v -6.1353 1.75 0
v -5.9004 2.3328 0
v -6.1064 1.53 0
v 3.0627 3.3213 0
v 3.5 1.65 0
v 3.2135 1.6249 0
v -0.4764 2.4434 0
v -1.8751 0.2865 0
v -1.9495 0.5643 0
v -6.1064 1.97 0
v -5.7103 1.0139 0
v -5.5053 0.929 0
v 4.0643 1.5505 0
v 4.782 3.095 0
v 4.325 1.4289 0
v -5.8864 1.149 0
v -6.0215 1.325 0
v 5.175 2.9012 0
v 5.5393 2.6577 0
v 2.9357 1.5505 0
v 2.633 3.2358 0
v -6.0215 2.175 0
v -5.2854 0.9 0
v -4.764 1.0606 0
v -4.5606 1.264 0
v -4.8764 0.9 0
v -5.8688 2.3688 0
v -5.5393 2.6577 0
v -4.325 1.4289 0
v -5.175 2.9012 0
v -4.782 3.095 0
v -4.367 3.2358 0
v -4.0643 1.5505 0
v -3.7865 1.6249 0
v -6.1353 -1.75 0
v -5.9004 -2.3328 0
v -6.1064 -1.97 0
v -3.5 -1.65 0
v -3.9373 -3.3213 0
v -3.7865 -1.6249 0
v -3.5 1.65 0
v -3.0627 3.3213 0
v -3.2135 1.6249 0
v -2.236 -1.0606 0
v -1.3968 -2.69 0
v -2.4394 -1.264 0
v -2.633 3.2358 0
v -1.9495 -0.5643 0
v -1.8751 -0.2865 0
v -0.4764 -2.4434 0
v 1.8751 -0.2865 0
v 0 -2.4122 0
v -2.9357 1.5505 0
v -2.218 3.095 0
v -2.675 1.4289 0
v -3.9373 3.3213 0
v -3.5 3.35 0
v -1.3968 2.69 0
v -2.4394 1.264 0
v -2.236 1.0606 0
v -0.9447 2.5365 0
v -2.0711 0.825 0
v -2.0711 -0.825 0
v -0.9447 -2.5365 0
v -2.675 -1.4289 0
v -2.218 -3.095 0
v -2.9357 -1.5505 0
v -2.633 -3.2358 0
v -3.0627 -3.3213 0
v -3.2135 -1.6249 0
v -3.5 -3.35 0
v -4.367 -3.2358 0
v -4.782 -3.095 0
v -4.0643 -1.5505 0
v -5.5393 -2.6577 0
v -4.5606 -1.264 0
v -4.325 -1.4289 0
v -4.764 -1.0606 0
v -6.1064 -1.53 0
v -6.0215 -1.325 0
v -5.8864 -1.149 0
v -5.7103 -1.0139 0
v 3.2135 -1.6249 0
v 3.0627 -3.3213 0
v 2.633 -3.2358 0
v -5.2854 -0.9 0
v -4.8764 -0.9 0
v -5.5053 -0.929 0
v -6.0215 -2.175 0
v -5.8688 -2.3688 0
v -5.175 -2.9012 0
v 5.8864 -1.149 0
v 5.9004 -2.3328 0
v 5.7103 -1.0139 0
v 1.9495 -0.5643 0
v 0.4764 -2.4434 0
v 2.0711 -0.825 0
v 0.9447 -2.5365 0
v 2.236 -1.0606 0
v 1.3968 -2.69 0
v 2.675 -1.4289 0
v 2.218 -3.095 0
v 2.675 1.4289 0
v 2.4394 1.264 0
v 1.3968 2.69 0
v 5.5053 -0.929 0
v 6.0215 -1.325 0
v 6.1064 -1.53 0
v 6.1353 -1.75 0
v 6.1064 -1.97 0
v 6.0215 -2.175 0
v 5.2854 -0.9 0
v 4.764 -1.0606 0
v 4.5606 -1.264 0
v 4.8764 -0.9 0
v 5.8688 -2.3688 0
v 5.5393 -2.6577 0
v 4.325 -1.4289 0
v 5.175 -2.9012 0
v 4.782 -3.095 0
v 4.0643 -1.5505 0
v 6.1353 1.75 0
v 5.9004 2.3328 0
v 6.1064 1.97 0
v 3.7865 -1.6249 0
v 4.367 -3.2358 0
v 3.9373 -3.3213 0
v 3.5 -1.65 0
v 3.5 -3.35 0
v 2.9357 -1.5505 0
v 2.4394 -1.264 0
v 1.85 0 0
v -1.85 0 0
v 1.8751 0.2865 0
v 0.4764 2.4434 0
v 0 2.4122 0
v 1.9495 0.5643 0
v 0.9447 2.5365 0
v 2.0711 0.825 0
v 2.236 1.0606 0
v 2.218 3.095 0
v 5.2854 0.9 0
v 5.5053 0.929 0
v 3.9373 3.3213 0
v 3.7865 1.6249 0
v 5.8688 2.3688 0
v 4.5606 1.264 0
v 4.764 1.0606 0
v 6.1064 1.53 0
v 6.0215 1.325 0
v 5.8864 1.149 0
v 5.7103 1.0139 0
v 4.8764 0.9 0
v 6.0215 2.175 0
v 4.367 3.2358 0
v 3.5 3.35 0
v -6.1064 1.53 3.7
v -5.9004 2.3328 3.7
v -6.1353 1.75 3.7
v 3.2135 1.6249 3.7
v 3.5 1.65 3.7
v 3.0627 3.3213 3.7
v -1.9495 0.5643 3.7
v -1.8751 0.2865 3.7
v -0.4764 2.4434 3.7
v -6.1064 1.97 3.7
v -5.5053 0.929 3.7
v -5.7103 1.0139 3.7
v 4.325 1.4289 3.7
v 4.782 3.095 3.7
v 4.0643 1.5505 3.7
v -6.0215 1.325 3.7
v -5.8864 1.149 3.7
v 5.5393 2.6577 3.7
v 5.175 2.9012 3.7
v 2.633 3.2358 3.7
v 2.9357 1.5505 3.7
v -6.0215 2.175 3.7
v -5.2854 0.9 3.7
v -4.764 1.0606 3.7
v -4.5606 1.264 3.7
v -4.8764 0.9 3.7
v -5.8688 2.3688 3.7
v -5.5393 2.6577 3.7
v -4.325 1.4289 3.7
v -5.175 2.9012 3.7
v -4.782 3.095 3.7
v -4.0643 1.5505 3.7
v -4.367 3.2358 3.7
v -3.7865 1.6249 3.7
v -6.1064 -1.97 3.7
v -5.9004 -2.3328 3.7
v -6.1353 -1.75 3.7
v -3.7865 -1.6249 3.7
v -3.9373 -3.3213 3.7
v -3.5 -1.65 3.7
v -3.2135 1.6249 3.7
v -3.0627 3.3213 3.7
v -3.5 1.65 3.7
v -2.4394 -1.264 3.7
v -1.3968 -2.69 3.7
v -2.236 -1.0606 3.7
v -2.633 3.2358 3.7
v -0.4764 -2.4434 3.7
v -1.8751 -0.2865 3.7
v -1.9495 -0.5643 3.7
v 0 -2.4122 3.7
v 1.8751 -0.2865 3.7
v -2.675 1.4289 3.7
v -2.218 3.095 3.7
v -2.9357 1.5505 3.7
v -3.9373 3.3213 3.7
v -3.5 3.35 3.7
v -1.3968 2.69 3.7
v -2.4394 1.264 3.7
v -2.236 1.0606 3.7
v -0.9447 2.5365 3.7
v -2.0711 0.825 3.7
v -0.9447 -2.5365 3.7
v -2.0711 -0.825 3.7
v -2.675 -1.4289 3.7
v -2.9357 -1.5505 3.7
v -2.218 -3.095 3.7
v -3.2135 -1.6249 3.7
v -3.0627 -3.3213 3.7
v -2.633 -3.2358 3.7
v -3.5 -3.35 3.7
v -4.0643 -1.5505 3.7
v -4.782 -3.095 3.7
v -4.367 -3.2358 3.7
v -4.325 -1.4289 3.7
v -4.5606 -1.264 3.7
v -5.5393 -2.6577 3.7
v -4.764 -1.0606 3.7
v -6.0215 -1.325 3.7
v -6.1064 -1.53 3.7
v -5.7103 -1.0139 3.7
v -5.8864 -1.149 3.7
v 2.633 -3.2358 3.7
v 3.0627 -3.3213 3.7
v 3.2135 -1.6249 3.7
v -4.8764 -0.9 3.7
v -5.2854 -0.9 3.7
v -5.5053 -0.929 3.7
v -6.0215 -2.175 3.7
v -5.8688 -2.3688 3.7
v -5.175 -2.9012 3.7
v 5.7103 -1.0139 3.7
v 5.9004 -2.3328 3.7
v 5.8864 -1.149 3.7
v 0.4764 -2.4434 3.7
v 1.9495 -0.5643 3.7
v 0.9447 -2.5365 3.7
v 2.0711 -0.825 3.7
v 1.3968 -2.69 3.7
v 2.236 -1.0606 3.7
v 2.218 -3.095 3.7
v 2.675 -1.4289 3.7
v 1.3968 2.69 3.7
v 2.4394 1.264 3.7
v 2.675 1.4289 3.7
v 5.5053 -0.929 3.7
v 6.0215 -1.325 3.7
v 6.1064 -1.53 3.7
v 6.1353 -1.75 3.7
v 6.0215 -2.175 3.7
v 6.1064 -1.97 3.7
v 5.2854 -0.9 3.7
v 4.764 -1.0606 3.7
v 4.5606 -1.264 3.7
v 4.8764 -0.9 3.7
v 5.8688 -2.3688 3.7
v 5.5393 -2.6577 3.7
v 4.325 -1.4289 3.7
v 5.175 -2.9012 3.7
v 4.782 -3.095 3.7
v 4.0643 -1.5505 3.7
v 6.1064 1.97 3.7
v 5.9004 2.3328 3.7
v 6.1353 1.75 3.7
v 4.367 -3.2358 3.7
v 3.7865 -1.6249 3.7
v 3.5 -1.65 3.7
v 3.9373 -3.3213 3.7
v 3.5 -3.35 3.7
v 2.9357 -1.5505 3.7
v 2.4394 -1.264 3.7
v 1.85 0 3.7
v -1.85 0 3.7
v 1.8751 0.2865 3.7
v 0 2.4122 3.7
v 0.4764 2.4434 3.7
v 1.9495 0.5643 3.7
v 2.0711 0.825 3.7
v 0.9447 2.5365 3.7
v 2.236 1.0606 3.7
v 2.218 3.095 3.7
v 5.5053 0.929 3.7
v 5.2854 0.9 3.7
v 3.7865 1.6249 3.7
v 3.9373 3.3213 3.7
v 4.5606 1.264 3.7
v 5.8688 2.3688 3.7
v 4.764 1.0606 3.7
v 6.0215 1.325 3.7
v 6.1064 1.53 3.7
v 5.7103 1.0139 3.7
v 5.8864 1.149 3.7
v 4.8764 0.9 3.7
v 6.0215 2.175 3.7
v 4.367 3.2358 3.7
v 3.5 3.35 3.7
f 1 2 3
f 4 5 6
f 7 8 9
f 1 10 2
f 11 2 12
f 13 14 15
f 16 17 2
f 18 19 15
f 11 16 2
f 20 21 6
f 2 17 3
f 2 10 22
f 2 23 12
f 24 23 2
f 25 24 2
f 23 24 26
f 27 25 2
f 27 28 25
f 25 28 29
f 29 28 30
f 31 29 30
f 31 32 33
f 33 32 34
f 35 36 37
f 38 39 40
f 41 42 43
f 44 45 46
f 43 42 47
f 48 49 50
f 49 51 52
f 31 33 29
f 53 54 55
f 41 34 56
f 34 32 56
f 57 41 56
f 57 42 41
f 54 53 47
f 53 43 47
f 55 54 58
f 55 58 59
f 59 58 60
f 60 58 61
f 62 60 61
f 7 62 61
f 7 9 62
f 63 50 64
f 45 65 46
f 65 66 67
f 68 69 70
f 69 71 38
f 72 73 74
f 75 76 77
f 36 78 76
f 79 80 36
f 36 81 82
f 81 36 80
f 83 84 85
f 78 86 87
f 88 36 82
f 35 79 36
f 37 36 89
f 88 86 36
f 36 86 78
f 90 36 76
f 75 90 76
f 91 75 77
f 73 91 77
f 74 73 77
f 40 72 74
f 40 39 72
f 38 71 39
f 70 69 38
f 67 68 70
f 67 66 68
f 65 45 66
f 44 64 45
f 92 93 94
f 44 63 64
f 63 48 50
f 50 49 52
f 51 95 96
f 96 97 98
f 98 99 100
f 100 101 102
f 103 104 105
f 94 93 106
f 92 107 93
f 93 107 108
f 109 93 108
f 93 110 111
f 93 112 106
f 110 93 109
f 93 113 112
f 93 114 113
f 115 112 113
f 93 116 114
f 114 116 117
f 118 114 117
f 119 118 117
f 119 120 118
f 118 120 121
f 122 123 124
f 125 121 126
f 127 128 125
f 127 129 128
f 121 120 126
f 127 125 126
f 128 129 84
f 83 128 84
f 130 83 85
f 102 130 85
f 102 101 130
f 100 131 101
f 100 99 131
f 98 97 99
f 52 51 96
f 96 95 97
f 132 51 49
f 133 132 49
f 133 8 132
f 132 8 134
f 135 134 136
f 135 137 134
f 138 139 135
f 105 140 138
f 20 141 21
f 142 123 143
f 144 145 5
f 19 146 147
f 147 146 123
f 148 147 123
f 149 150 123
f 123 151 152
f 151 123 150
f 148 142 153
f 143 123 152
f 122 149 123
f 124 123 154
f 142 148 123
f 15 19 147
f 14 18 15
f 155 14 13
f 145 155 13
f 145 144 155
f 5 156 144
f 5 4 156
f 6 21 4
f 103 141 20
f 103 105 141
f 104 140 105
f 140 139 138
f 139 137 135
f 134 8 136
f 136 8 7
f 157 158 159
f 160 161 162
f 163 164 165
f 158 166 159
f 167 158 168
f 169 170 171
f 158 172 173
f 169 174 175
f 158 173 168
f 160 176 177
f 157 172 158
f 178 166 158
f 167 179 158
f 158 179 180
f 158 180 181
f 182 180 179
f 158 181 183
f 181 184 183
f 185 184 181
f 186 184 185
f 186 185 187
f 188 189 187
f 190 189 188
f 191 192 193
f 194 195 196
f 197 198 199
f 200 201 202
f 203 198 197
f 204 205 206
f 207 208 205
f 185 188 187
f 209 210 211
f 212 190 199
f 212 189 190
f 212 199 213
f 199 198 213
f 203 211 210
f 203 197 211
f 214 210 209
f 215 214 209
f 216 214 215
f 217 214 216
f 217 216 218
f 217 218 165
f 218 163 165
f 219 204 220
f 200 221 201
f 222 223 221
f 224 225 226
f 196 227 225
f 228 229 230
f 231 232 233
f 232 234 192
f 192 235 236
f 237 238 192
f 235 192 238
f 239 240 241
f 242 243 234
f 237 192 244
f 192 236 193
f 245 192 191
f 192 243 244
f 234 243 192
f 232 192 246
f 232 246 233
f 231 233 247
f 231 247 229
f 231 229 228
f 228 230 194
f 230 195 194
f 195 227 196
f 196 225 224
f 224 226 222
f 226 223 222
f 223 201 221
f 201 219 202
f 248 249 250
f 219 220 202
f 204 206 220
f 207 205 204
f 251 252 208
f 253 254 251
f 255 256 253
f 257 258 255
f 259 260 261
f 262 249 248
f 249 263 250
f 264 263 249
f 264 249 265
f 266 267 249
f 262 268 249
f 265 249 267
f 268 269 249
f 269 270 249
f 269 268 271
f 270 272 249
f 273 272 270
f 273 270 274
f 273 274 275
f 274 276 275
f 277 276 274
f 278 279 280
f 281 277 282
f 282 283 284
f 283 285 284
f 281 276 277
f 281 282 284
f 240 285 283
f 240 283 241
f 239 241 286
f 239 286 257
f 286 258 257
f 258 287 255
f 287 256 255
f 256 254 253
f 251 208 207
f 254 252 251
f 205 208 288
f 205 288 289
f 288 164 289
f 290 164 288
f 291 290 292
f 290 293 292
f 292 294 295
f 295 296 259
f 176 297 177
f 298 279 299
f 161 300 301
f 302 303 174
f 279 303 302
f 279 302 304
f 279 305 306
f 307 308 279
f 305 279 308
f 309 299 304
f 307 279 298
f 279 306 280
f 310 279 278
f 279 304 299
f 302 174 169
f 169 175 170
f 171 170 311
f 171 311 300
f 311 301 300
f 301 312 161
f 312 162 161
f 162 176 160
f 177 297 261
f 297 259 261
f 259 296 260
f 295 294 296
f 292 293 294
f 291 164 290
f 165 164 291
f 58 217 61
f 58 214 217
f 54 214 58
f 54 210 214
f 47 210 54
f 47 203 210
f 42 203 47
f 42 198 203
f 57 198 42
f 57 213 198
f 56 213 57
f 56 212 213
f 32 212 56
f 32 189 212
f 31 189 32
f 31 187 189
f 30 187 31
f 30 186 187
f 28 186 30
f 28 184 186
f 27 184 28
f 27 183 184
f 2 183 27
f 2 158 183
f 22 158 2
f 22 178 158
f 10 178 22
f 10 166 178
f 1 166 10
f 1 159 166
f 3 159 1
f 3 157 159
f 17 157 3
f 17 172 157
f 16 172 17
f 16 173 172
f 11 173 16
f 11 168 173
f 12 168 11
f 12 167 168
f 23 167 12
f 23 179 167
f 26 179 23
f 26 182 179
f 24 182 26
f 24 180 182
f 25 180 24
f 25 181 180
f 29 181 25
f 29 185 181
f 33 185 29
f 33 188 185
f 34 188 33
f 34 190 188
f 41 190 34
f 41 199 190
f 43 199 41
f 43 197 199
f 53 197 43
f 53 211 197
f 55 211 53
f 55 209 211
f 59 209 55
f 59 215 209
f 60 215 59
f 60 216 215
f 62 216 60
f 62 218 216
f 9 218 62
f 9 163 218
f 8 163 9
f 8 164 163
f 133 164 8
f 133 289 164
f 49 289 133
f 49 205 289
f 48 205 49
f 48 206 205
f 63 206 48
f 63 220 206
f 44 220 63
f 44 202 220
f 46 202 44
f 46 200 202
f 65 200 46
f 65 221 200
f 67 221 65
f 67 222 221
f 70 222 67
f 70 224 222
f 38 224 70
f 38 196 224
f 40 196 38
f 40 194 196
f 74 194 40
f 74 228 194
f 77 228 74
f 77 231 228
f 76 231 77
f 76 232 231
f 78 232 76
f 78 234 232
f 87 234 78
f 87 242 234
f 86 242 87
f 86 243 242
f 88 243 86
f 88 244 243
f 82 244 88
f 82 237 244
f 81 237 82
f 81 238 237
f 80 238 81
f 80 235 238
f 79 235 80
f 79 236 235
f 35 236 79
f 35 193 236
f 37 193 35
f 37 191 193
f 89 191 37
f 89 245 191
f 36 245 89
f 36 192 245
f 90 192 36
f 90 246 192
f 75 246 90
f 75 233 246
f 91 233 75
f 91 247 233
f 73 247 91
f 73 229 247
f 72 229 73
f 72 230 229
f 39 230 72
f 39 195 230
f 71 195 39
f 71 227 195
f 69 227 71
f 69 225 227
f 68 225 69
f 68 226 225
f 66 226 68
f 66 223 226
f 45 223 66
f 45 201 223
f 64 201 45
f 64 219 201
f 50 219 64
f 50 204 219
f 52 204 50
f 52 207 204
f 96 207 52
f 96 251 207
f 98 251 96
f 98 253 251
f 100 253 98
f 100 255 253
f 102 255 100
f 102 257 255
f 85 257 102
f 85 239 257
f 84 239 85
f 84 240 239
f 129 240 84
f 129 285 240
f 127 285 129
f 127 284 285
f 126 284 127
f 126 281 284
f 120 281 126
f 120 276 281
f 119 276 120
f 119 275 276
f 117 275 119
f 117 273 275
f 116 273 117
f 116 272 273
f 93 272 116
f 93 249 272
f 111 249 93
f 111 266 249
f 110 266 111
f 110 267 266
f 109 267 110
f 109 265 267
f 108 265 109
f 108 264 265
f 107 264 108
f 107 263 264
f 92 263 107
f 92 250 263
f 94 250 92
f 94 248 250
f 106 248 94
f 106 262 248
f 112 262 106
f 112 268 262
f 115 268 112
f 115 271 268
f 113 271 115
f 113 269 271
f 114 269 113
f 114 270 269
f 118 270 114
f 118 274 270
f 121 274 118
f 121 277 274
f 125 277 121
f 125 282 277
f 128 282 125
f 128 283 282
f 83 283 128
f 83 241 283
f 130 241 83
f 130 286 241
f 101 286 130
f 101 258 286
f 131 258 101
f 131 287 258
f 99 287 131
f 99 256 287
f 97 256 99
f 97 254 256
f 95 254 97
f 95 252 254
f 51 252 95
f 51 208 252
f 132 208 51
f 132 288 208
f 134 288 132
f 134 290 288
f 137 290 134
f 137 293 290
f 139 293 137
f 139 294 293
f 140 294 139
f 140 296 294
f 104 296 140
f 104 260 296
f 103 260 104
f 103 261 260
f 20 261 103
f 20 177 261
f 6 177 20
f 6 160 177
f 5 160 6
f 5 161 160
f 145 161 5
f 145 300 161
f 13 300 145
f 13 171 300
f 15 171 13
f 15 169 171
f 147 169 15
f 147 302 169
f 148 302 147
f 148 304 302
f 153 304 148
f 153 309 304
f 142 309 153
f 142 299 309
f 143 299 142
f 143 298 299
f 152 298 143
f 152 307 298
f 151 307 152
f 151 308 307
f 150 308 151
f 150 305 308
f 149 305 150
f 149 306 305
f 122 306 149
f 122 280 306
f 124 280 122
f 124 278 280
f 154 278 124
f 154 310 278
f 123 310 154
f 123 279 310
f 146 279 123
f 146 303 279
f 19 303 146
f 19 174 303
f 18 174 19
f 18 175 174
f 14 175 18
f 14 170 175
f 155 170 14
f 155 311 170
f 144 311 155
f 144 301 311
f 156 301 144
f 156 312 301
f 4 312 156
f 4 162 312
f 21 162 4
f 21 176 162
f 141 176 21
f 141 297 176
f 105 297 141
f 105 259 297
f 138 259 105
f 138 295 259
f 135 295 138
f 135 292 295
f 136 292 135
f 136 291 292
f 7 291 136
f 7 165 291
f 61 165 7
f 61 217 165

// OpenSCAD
// Allsorts Bracelet provided by Stellar Innovation
// http://www.thingiverse.com/stellarinnovation/about
// under Creative Commons License, Attribution (BY)

// Select part to print
partToPrint=1; // [1:link, 2:cube-bottom, 3:cube-middle, 4:cube-top, 5:whole-cube, 6:puck-outer, 7:puck-inner, 8:whole-puck, 9:button, 10:magnet-lock]

// Height of "cube" part
cubeHeight = 9.5;   // [7.5:0.5:12.5]

// Width of "cube" part
cubeWidth=19.0; // [15:0.5:25]

// Outer diameter of "puck" part
puckOuterDiameter=22.5; // [20:0.5:25]

// Inner diameter of "puck" part
puckInnerDiameter=9.5;  // [7.5:0.5:10]

// Height of "puck" part
puckHeight=11.5;    // [10:0.5:15]

// Diameter of "button" part
buttonDiameter=17; // [15:0.5:25]

// Outer diameter of magnet lock
tubeDiameter = 12.7;       // [10:0.1:15]

// Length of magnet lock
tubeLength = 22;        // [15:1:25]

// Diameter of magnet +tolerance (magnet-lock part only)
magnetDiameter = 10.5;           // [2:0.1:15]

// Length of magnet (magnet-lock part only)
magnetLength = 2;             // [2:0.1:10]


linkAxleDiameter = 1*3;
linkWall = 1*2;
linkOuterDiameter = 2*linkWall + linkAxleDiameter;
linkWidth = 1*4;

buttonHeight=1*6.4;
buttonPearlDiameter=1*1.6;
buttonPearlGrid=1*2.5;
buttonEdgeRadius=1*3;

tightFit=1*0.15;
clearance = 1*0.3;

if (partToPrint==1) {
  TypeBLink(linkWidth, linkOuterDiameter, linkAxleDiameter, 0, clearance);
}
else if (partToPrint==2 || partToPrint==4) {
  colors=["White", "Black", "Orange"];
  color(colors[partToPrint-2])
    CubePart(partToPrint-2);
}
else if (partToPrint==3) {
  color("Black")
    mirror([0, 0, 1])
      CubePart(layer=1);
}
else if (partToPrint==5) {
  for (layer=[0:2]) {
    colors=["White", "Black", "Orange"];
    color(colors[layer])
      translate([0,0,layer*cubeHeight/3])
        CubePart(layer);
  }
}
else if (partToPrint==6) {
  color("Yellow")
    mirror([0,0,1])
      OuterPuckPart();
}
else if (partToPrint==7 || partToPrint==8) {
    color("Black")
      InnerPuckPart();
    if (partToPrint==8)
      color("Yellow")
        OuterPuckPart();
}
else if (partToPrint==9) {
  color("Pink")
    ButtonPart();
}
else if (partToPrint==10) {
    color("Black")
      TubePart();
}


module CubePart(layer) {
  height = cubeHeight/3;
    
  difference() {
    translate([-0.5*cubeWidth, -0.5*cubeWidth])  
      cube([cubeWidth, cubeWidth, height]);

    translate([0, 0, -height*layer]) {
      x1 = 0.5*(cubeWidth+clearance);     
      for (x=[-x1, +x1])
        translate([x, -0.5*cubeWidth])
          Fillet(cubeWidth);
    
    
      if (layer!=2) {
        translate([x1, 0])
          LinkCutout();
        translate([-x1, 0])
          mirror([1, 0, 0])
            LinkCutout();
      }
    }
  }  
}

module OuterPuckPart() {
  h = sqrt(0.75)*0.5*linkAxleDiameter + 0.5*linkOuterDiameter + clearance;
  w = linkWidth+clearance;
  difference() {
    cylinder(d=puckOuterDiameter, h=puckHeight, $fn=90);
      
    cylinder(d=puckOuterDiameter-2*linkWall, h=h, $fn=90);
    cylinder(d=puckInnerDiameter+tightFit, h=puckHeight, $fn=60);
      
    translate([-0.5*puckOuterDiameter, -0.5*w])
      cube([puckOuterDiameter, w, h]);
  }
}

module InnerPuckPart() {
  h = sqrt(0.75)*0.5*linkAxleDiameter + 0.5*linkOuterDiameter;
  difference() {
    union() {
      cylinder(d=puckOuterDiameter-2*(linkWall+tightFit), h=h, $fn=90);
      cylinder(d=puckInnerDiameter-tightFit, h=puckHeight, $fn=60);
    }  
    x1 = 0.5*(puckOuterDiameter+clearance);           
    translate([x1, 0])
      LinkCutout();
    translate([-x1, 0])
      mirror([1, 0, 0])
        LinkCutout();
  }
}


module ButtonPart() {
  x1=0.5*(buttonDiameter+clearance);
  gridX=buttonPearlGrid;
  offsetY=0.25*sqrt(3)*buttonPearlGrid;
  r = 0.5*buttonDiameter - buttonEdgeRadius;
    
  difference() {
    union() {
      BasicButton();
        
      maxGrid=r + buttonHeight + (0.5*PI-1)*buttonEdgeRadius;
      for (x=[0:gridX:2*maxGrid]) {
        Pearls(x, 0, maxGrid);
        Pearls(x+0.5*gridX, offsetY, maxGrid);
      }
    } 
    
    translate([x1, 0])
      LinkCutout();
    translate([-x1, 0])
      mirror([1, 0, 0])
        LinkCutout();
  }
}

module BasicButton() {
  r=buttonEdgeRadius;
  x0=0.5*buttonDiameter-r;
  y0=buttonHeight-r;
    
  rotate_extrude() {
    square([x0, buttonHeight]);
    square([0.5*buttonDiameter, y0]);  
    translate([x0,y0])
      circle(r=r, $fn=30);
  }
}

module Pearls(x, y0, maxGrid) {
  gridY=0.5*sqrt(3)*buttonPearlGrid;    
  for (y=[y0:gridY:maxGrid]) {
    Pearl(x, y);
    if (x!=0) Pearl(-x, y);
    if (y!=0) Pearl(x, -y);
    if (x!=0 || y!=0) Pearl(-x, -y);
  }
}

module Pearl(x, y) {
  d = sqrt(x*x + y*y);
  r1 = 0.5*buttonDiameter;
  r0 = r1 - buttonEdgeRadius;
    
  if (d < r0)
    translate([x, y])
      cylinder(d=buttonPearlDiameter, h=buttonHeight+0.5*buttonPearlDiameter, $fn=12);
  else  {
    d0 = d - r0;
    arc = 0.5*buttonEdgeRadius*PI;
    arg = atan2(y, x);
    a = (d0<arc)? 90*d0/arc : 90;
    r2 = r0 + buttonEdgeRadius*sin(a);
    x2 = x*r2/d;
    y2 = y*r2/d;
    z2 = buttonHeight + buttonEdgeRadius*(cos(a)-1) - max(0, d0-arc);
    if (z2>0.5*buttonPearlDiameter && abs(y2) > 0.5*(linkWidth + buttonPearlDiameter))
    translate([x2, y2, z2])
      rotate([0, a, arg])
        cylinder(d=buttonPearlDiameter, h=buttonPearlDiameter, center=true, $fn=12);
//       if (d0 < arc) {
//      a = 90*d0/arc;
//      r2 = r0 + buttonEdgeRadius*sin(a);
//      x2 = x*r2/d;
//      y2 = y*r2/d;
//      z2 = buttonHeight + buttonEdgeRadius*(cos(a)-1);
//      if (abs(y2) > 0.5*(linkWidth + buttonPearlDiameter))
//      translate([x2, y2, z2])
//        rotate([0, a, arg])
//          cylinder(d=buttonPearlDiameter, h=buttonPearlDiameter, center=true, $fn=12);
//    }
//    else {
//      z = buttonHeight-buttonEdgeRadius-(d0-arc);
//      if (z > 0.5*buttonPearlDiameter)
//        translate([0, 0, z])
//          rotate([0, 90, arg])
//            cylinder(d=buttonPearlDiameter, h=r1+0.5*buttonPearlDiameter, $fn=12);
//    }
  }
}

module TubePart() {
  x1=0.5*(tubeDiameter+clearance);
  
  difference() {
    BasicTube();
      
    translate([x1, -0.5*tubeLength])
      LinkCutout();
  }
}

module BasicTube() {
  r=0.5*tubeDiameter;
    
  translate([0,0,r])
    rotate([90,0])
      difference() {
        union() {
          cylinder(d=tubeDiameter, h=tubeLength, $fn=60);
          rotate(-30)
            translate([0,-r])
              cube([r, r, tubeLength]);
          rotate(30)
            translate([-r,-r])
              cube([r, r, tubeLength]);
        }    
        translate([-r, -2*r])
          cube([2*r, r, tubeLength]);
        cylinder(d=magnetDiameter, h=magnetLength, $fn=30);
        translate([0,0,tubeLength-magnetLength])
          cylinder(d=magnetDiameter, h=magnetLength, $fn=30);
      }
}

module Fillet(length) {
  r=0.5*(linkOuterDiameter - clearance);
  x1=0.5*linkOuterDiameter;
  z1=sqrt(0.75)*0.5*(linkAxleDiameter-clearance);
    
  difference() {
    translate([-x1, 0])
      cube([linkOuterDiameter, length, z1]);
      
    rotate([-90, 0]) {
      translate([-x1, -z1])
        cylinder(r=r, h=length, $fn=48);
      translate([x1, -z1])
        cylinder(r=r, h=length, $fn=48);
    }
  }
}

module LinkCutout() {
  w=linkWidth+2*clearance;
  d=linkOuterDiameter+clearance;
  r=0.5*d;
  s=sqrt(0.5)*r;
  z1=sqrt(0.75)*0.5*(linkAxleDiameter-clearance);
    
  translate([-r, 0])
    difference() {
      translate([0, 0, z1])
        rotate([-90, 0]) {
          cylinder(d=d, h=w, center=true, $fn=24);
          linear_extrude(height=w, center=true)
            polygon([[-s,-s], [0,r], [r,r], [r,-2*s-r]]);
        }
      
      width=0.5*(linkAxleDiameter-clearance);
      w2=0.8;
      eps=0.01;   
      rotate([90, 0]) {
        linear_extrude(height=w+eps, center=true)
          AxleCrossView(linkAxleDiameter, width, clearance);
        linear_extrude(height=w2, center=true)
          AxleCrossView(linkAxleDiameter, width+2*w2, clearance);
      } 
    }
}

// The axle is extruded from the Axle cross-view
//
// diameter    axle diameter (plus clearance)
// width       width of axle at bottom (<diameter)
// length      length of extruded axle
// clerance    distance between moving parts

module Axle(diameter, width, length, clearance=0) {
  rotate([90, 0])
   linear_extrude(height=length, center=true)
     AxleCrossView(diameter, width, clearance); 
}

// The axle lies flat when printed, but it is rounded at the top
//
// diameter    axle diameter (plus clearance)
// width       width of axle at bottom (<diameter)
// clerance    distance between moving parts

module AxleCrossView(diameter, width, clearance=0) {
  r = 0.5*(diameter - clearance);
  x1 = 0.5*width;
  y1 = sqrt(0.75)*r;

  intersection() {
    translate([0, y1])
      circle(r=r, $fn=36);
    translate([-x1, 0])
      square([width, y1+r]);
  }  
}

// Link with bushing (type-B)

module TypeBLink(linkWidth,
                 outerDiameter, 
                 axleDiameter,
                 extraLength = 0,
                 clearance = 0,
                 topStopAngle = 90,
                 bottomStopAngle = 90) {
  linear_extrude(height=linkWidth-clearance) {
    HalfALink(outerDiameter = outerDiameter, 
               axleDiameter = axleDiameter, 
               openingGap = 0.5*axleDiameter,
               extraLength = 0.5*extraLength, 
               clearance = clearance,
               topStopAngle = topStopAngle,
               bottomStopAngle = bottomStopAngle);
    mirror([1, 0, 0])
      HalfALink(outerDiameter = outerDiameter, 
                 axleDiameter = axleDiameter, 
                 openingGap = 0.5*axleDiameter,
                 extraLength = 0.5*extraLength,
                 clearance = clearance,
                 topStopAngle = topStopAngle,
                 bottomStopAngle = bottomStopAngle);
  }
}
// Half a Link is the right half of a (Type-A or B) link. It can also be combined with other parts.
//
// outerDiameter       Diameter of the link (plus clearance)
// axleDiameter        A positive value for a bushing with a hole for the axle (i.e type-B link)
// openingGap          Specifies the width of a possible opening gap (less clearance)
// extraLength         Makes the links longer
// clearance           Distance between moving parts
// flatBottom
// topStopAngle        Angle of top stop block
// bottomStopAngle     Angle of bottom stop block  

module HalfALink(outerDiameter,
                 axleDiameter=0,
                 openingGap=0,
                 extraLength = 0,
                 clearance = 0,
                 flatBottom = false,
                 topStopAngle = 90,
                 bottomStopAngle = 90) {
  x0 = 0.5*outerDiameter + extraLength;
  D1 = outerDiameter - clearance;
                       
  difference() {
    union() {
      translate([x0, 0]) {
        circle(d=D1, $fn=48);
        // stop angles (90 degrees=no stop)
        StopBlock(D1, topStopAngle);
        mirror([0,1])
          StopBlock(D1, bottomStopAngle);
      }
      
      // connection between link halves
      y_t = 0.25*sqrt(3)*D1;     
      y0 = flatBottom? -0.5*D1 : -y_t;
      translate([0, y0])
        square([x0, y_t-y0]);
    }
    
    // axle and opening
    translate([x0, 0]) {
      if (axleDiameter > 0)
        circle(d=axleDiameter+clearance, $fn=36);
      if (openingGap > 0) {
        HalfAnOpening(openingGap, outerDiameter, axleDiameter, topStopAngle, clearance);
        mirror([0, 1])
          HalfAnOpening(openingGap, outerDiameter, axleDiameter, bottomStopAngle, clearance);
      }
    }
    
    // Narrow mid part
    D2 = outerDiameter + clearance;
    y2 = 0.5*sqrt(3)*outerDiameter;
    translate([extraLength, y2])
      circle(d=D2, $fn=48);
    translate([0, y2-0.5*D2])
      square([extraLength, D2]);
    
    if (!flatBottom) {
      translate([extraLength, -y2])
        circle(d=D2, $fn=48);
      translate([0, -y2])
      square([extraLength, 0.5*D2]);
    }
  }
}

// The stop block limits the rotation of the links
//
// diameter        diameter of link
// stopAngle       angle (CCW rotation) of stop block 

module StopBlock(diameter, stopAngle) {
  r = 0.5*diameter;
    
  intersection() {
    square([r, r]);
    rotate(stopAngle)
      square([r,r]);
  }
}

// Half an opening is the upper half of the opening of a type-B (bushing) link
//
// opening gap     width of opening (less clearance), half of which is in the upper half (this part)
// axleDiameter    (less clearance)
// stopAngle       angle of stop block (90 degrees=no stop block)
// clearance       distance between moving parts (e.g. axle and bushing)

module HalfAnOpening(openingGap,
                        outerDiameter,
                        axleDiameter,
                        stopAngle = 90,
                        clearance = 0) {
    // bushing for axle
  R = 0.5*(outerDiameter - clearance);
  w = 0.5*(outerDiameter - axleDiameter) - clearance;

  // opening
  y0 = 0.5*openingGap + 0.5*clearance;
  // fancy fillet/radius
  r = 0.5*w;
  Rmid = R - r;
  y1 = y0+r;
  y_t = R*sin(stopAngle);
  // touches outer perimeter or stop block?
  x1 = (y_t < y1)? (Rmid-y1*sin(stopAngle))/cos(stopAngle) : sqrt(Rmid*Rmid-y1*y1);
  x2 = 1.5*R;
  y2 = (y_t < y1)? y1 + (x2-x1)*tan(stopAngle) : y1*x2/x1;
  difference() {
    polygon([[0, 0], [0, y0], [x1, y0], [x1,y1], [x2,y2], [x2, 0]]);
    translate([x1, y1])
      circle(r=r, $fn=24);
  }
}
